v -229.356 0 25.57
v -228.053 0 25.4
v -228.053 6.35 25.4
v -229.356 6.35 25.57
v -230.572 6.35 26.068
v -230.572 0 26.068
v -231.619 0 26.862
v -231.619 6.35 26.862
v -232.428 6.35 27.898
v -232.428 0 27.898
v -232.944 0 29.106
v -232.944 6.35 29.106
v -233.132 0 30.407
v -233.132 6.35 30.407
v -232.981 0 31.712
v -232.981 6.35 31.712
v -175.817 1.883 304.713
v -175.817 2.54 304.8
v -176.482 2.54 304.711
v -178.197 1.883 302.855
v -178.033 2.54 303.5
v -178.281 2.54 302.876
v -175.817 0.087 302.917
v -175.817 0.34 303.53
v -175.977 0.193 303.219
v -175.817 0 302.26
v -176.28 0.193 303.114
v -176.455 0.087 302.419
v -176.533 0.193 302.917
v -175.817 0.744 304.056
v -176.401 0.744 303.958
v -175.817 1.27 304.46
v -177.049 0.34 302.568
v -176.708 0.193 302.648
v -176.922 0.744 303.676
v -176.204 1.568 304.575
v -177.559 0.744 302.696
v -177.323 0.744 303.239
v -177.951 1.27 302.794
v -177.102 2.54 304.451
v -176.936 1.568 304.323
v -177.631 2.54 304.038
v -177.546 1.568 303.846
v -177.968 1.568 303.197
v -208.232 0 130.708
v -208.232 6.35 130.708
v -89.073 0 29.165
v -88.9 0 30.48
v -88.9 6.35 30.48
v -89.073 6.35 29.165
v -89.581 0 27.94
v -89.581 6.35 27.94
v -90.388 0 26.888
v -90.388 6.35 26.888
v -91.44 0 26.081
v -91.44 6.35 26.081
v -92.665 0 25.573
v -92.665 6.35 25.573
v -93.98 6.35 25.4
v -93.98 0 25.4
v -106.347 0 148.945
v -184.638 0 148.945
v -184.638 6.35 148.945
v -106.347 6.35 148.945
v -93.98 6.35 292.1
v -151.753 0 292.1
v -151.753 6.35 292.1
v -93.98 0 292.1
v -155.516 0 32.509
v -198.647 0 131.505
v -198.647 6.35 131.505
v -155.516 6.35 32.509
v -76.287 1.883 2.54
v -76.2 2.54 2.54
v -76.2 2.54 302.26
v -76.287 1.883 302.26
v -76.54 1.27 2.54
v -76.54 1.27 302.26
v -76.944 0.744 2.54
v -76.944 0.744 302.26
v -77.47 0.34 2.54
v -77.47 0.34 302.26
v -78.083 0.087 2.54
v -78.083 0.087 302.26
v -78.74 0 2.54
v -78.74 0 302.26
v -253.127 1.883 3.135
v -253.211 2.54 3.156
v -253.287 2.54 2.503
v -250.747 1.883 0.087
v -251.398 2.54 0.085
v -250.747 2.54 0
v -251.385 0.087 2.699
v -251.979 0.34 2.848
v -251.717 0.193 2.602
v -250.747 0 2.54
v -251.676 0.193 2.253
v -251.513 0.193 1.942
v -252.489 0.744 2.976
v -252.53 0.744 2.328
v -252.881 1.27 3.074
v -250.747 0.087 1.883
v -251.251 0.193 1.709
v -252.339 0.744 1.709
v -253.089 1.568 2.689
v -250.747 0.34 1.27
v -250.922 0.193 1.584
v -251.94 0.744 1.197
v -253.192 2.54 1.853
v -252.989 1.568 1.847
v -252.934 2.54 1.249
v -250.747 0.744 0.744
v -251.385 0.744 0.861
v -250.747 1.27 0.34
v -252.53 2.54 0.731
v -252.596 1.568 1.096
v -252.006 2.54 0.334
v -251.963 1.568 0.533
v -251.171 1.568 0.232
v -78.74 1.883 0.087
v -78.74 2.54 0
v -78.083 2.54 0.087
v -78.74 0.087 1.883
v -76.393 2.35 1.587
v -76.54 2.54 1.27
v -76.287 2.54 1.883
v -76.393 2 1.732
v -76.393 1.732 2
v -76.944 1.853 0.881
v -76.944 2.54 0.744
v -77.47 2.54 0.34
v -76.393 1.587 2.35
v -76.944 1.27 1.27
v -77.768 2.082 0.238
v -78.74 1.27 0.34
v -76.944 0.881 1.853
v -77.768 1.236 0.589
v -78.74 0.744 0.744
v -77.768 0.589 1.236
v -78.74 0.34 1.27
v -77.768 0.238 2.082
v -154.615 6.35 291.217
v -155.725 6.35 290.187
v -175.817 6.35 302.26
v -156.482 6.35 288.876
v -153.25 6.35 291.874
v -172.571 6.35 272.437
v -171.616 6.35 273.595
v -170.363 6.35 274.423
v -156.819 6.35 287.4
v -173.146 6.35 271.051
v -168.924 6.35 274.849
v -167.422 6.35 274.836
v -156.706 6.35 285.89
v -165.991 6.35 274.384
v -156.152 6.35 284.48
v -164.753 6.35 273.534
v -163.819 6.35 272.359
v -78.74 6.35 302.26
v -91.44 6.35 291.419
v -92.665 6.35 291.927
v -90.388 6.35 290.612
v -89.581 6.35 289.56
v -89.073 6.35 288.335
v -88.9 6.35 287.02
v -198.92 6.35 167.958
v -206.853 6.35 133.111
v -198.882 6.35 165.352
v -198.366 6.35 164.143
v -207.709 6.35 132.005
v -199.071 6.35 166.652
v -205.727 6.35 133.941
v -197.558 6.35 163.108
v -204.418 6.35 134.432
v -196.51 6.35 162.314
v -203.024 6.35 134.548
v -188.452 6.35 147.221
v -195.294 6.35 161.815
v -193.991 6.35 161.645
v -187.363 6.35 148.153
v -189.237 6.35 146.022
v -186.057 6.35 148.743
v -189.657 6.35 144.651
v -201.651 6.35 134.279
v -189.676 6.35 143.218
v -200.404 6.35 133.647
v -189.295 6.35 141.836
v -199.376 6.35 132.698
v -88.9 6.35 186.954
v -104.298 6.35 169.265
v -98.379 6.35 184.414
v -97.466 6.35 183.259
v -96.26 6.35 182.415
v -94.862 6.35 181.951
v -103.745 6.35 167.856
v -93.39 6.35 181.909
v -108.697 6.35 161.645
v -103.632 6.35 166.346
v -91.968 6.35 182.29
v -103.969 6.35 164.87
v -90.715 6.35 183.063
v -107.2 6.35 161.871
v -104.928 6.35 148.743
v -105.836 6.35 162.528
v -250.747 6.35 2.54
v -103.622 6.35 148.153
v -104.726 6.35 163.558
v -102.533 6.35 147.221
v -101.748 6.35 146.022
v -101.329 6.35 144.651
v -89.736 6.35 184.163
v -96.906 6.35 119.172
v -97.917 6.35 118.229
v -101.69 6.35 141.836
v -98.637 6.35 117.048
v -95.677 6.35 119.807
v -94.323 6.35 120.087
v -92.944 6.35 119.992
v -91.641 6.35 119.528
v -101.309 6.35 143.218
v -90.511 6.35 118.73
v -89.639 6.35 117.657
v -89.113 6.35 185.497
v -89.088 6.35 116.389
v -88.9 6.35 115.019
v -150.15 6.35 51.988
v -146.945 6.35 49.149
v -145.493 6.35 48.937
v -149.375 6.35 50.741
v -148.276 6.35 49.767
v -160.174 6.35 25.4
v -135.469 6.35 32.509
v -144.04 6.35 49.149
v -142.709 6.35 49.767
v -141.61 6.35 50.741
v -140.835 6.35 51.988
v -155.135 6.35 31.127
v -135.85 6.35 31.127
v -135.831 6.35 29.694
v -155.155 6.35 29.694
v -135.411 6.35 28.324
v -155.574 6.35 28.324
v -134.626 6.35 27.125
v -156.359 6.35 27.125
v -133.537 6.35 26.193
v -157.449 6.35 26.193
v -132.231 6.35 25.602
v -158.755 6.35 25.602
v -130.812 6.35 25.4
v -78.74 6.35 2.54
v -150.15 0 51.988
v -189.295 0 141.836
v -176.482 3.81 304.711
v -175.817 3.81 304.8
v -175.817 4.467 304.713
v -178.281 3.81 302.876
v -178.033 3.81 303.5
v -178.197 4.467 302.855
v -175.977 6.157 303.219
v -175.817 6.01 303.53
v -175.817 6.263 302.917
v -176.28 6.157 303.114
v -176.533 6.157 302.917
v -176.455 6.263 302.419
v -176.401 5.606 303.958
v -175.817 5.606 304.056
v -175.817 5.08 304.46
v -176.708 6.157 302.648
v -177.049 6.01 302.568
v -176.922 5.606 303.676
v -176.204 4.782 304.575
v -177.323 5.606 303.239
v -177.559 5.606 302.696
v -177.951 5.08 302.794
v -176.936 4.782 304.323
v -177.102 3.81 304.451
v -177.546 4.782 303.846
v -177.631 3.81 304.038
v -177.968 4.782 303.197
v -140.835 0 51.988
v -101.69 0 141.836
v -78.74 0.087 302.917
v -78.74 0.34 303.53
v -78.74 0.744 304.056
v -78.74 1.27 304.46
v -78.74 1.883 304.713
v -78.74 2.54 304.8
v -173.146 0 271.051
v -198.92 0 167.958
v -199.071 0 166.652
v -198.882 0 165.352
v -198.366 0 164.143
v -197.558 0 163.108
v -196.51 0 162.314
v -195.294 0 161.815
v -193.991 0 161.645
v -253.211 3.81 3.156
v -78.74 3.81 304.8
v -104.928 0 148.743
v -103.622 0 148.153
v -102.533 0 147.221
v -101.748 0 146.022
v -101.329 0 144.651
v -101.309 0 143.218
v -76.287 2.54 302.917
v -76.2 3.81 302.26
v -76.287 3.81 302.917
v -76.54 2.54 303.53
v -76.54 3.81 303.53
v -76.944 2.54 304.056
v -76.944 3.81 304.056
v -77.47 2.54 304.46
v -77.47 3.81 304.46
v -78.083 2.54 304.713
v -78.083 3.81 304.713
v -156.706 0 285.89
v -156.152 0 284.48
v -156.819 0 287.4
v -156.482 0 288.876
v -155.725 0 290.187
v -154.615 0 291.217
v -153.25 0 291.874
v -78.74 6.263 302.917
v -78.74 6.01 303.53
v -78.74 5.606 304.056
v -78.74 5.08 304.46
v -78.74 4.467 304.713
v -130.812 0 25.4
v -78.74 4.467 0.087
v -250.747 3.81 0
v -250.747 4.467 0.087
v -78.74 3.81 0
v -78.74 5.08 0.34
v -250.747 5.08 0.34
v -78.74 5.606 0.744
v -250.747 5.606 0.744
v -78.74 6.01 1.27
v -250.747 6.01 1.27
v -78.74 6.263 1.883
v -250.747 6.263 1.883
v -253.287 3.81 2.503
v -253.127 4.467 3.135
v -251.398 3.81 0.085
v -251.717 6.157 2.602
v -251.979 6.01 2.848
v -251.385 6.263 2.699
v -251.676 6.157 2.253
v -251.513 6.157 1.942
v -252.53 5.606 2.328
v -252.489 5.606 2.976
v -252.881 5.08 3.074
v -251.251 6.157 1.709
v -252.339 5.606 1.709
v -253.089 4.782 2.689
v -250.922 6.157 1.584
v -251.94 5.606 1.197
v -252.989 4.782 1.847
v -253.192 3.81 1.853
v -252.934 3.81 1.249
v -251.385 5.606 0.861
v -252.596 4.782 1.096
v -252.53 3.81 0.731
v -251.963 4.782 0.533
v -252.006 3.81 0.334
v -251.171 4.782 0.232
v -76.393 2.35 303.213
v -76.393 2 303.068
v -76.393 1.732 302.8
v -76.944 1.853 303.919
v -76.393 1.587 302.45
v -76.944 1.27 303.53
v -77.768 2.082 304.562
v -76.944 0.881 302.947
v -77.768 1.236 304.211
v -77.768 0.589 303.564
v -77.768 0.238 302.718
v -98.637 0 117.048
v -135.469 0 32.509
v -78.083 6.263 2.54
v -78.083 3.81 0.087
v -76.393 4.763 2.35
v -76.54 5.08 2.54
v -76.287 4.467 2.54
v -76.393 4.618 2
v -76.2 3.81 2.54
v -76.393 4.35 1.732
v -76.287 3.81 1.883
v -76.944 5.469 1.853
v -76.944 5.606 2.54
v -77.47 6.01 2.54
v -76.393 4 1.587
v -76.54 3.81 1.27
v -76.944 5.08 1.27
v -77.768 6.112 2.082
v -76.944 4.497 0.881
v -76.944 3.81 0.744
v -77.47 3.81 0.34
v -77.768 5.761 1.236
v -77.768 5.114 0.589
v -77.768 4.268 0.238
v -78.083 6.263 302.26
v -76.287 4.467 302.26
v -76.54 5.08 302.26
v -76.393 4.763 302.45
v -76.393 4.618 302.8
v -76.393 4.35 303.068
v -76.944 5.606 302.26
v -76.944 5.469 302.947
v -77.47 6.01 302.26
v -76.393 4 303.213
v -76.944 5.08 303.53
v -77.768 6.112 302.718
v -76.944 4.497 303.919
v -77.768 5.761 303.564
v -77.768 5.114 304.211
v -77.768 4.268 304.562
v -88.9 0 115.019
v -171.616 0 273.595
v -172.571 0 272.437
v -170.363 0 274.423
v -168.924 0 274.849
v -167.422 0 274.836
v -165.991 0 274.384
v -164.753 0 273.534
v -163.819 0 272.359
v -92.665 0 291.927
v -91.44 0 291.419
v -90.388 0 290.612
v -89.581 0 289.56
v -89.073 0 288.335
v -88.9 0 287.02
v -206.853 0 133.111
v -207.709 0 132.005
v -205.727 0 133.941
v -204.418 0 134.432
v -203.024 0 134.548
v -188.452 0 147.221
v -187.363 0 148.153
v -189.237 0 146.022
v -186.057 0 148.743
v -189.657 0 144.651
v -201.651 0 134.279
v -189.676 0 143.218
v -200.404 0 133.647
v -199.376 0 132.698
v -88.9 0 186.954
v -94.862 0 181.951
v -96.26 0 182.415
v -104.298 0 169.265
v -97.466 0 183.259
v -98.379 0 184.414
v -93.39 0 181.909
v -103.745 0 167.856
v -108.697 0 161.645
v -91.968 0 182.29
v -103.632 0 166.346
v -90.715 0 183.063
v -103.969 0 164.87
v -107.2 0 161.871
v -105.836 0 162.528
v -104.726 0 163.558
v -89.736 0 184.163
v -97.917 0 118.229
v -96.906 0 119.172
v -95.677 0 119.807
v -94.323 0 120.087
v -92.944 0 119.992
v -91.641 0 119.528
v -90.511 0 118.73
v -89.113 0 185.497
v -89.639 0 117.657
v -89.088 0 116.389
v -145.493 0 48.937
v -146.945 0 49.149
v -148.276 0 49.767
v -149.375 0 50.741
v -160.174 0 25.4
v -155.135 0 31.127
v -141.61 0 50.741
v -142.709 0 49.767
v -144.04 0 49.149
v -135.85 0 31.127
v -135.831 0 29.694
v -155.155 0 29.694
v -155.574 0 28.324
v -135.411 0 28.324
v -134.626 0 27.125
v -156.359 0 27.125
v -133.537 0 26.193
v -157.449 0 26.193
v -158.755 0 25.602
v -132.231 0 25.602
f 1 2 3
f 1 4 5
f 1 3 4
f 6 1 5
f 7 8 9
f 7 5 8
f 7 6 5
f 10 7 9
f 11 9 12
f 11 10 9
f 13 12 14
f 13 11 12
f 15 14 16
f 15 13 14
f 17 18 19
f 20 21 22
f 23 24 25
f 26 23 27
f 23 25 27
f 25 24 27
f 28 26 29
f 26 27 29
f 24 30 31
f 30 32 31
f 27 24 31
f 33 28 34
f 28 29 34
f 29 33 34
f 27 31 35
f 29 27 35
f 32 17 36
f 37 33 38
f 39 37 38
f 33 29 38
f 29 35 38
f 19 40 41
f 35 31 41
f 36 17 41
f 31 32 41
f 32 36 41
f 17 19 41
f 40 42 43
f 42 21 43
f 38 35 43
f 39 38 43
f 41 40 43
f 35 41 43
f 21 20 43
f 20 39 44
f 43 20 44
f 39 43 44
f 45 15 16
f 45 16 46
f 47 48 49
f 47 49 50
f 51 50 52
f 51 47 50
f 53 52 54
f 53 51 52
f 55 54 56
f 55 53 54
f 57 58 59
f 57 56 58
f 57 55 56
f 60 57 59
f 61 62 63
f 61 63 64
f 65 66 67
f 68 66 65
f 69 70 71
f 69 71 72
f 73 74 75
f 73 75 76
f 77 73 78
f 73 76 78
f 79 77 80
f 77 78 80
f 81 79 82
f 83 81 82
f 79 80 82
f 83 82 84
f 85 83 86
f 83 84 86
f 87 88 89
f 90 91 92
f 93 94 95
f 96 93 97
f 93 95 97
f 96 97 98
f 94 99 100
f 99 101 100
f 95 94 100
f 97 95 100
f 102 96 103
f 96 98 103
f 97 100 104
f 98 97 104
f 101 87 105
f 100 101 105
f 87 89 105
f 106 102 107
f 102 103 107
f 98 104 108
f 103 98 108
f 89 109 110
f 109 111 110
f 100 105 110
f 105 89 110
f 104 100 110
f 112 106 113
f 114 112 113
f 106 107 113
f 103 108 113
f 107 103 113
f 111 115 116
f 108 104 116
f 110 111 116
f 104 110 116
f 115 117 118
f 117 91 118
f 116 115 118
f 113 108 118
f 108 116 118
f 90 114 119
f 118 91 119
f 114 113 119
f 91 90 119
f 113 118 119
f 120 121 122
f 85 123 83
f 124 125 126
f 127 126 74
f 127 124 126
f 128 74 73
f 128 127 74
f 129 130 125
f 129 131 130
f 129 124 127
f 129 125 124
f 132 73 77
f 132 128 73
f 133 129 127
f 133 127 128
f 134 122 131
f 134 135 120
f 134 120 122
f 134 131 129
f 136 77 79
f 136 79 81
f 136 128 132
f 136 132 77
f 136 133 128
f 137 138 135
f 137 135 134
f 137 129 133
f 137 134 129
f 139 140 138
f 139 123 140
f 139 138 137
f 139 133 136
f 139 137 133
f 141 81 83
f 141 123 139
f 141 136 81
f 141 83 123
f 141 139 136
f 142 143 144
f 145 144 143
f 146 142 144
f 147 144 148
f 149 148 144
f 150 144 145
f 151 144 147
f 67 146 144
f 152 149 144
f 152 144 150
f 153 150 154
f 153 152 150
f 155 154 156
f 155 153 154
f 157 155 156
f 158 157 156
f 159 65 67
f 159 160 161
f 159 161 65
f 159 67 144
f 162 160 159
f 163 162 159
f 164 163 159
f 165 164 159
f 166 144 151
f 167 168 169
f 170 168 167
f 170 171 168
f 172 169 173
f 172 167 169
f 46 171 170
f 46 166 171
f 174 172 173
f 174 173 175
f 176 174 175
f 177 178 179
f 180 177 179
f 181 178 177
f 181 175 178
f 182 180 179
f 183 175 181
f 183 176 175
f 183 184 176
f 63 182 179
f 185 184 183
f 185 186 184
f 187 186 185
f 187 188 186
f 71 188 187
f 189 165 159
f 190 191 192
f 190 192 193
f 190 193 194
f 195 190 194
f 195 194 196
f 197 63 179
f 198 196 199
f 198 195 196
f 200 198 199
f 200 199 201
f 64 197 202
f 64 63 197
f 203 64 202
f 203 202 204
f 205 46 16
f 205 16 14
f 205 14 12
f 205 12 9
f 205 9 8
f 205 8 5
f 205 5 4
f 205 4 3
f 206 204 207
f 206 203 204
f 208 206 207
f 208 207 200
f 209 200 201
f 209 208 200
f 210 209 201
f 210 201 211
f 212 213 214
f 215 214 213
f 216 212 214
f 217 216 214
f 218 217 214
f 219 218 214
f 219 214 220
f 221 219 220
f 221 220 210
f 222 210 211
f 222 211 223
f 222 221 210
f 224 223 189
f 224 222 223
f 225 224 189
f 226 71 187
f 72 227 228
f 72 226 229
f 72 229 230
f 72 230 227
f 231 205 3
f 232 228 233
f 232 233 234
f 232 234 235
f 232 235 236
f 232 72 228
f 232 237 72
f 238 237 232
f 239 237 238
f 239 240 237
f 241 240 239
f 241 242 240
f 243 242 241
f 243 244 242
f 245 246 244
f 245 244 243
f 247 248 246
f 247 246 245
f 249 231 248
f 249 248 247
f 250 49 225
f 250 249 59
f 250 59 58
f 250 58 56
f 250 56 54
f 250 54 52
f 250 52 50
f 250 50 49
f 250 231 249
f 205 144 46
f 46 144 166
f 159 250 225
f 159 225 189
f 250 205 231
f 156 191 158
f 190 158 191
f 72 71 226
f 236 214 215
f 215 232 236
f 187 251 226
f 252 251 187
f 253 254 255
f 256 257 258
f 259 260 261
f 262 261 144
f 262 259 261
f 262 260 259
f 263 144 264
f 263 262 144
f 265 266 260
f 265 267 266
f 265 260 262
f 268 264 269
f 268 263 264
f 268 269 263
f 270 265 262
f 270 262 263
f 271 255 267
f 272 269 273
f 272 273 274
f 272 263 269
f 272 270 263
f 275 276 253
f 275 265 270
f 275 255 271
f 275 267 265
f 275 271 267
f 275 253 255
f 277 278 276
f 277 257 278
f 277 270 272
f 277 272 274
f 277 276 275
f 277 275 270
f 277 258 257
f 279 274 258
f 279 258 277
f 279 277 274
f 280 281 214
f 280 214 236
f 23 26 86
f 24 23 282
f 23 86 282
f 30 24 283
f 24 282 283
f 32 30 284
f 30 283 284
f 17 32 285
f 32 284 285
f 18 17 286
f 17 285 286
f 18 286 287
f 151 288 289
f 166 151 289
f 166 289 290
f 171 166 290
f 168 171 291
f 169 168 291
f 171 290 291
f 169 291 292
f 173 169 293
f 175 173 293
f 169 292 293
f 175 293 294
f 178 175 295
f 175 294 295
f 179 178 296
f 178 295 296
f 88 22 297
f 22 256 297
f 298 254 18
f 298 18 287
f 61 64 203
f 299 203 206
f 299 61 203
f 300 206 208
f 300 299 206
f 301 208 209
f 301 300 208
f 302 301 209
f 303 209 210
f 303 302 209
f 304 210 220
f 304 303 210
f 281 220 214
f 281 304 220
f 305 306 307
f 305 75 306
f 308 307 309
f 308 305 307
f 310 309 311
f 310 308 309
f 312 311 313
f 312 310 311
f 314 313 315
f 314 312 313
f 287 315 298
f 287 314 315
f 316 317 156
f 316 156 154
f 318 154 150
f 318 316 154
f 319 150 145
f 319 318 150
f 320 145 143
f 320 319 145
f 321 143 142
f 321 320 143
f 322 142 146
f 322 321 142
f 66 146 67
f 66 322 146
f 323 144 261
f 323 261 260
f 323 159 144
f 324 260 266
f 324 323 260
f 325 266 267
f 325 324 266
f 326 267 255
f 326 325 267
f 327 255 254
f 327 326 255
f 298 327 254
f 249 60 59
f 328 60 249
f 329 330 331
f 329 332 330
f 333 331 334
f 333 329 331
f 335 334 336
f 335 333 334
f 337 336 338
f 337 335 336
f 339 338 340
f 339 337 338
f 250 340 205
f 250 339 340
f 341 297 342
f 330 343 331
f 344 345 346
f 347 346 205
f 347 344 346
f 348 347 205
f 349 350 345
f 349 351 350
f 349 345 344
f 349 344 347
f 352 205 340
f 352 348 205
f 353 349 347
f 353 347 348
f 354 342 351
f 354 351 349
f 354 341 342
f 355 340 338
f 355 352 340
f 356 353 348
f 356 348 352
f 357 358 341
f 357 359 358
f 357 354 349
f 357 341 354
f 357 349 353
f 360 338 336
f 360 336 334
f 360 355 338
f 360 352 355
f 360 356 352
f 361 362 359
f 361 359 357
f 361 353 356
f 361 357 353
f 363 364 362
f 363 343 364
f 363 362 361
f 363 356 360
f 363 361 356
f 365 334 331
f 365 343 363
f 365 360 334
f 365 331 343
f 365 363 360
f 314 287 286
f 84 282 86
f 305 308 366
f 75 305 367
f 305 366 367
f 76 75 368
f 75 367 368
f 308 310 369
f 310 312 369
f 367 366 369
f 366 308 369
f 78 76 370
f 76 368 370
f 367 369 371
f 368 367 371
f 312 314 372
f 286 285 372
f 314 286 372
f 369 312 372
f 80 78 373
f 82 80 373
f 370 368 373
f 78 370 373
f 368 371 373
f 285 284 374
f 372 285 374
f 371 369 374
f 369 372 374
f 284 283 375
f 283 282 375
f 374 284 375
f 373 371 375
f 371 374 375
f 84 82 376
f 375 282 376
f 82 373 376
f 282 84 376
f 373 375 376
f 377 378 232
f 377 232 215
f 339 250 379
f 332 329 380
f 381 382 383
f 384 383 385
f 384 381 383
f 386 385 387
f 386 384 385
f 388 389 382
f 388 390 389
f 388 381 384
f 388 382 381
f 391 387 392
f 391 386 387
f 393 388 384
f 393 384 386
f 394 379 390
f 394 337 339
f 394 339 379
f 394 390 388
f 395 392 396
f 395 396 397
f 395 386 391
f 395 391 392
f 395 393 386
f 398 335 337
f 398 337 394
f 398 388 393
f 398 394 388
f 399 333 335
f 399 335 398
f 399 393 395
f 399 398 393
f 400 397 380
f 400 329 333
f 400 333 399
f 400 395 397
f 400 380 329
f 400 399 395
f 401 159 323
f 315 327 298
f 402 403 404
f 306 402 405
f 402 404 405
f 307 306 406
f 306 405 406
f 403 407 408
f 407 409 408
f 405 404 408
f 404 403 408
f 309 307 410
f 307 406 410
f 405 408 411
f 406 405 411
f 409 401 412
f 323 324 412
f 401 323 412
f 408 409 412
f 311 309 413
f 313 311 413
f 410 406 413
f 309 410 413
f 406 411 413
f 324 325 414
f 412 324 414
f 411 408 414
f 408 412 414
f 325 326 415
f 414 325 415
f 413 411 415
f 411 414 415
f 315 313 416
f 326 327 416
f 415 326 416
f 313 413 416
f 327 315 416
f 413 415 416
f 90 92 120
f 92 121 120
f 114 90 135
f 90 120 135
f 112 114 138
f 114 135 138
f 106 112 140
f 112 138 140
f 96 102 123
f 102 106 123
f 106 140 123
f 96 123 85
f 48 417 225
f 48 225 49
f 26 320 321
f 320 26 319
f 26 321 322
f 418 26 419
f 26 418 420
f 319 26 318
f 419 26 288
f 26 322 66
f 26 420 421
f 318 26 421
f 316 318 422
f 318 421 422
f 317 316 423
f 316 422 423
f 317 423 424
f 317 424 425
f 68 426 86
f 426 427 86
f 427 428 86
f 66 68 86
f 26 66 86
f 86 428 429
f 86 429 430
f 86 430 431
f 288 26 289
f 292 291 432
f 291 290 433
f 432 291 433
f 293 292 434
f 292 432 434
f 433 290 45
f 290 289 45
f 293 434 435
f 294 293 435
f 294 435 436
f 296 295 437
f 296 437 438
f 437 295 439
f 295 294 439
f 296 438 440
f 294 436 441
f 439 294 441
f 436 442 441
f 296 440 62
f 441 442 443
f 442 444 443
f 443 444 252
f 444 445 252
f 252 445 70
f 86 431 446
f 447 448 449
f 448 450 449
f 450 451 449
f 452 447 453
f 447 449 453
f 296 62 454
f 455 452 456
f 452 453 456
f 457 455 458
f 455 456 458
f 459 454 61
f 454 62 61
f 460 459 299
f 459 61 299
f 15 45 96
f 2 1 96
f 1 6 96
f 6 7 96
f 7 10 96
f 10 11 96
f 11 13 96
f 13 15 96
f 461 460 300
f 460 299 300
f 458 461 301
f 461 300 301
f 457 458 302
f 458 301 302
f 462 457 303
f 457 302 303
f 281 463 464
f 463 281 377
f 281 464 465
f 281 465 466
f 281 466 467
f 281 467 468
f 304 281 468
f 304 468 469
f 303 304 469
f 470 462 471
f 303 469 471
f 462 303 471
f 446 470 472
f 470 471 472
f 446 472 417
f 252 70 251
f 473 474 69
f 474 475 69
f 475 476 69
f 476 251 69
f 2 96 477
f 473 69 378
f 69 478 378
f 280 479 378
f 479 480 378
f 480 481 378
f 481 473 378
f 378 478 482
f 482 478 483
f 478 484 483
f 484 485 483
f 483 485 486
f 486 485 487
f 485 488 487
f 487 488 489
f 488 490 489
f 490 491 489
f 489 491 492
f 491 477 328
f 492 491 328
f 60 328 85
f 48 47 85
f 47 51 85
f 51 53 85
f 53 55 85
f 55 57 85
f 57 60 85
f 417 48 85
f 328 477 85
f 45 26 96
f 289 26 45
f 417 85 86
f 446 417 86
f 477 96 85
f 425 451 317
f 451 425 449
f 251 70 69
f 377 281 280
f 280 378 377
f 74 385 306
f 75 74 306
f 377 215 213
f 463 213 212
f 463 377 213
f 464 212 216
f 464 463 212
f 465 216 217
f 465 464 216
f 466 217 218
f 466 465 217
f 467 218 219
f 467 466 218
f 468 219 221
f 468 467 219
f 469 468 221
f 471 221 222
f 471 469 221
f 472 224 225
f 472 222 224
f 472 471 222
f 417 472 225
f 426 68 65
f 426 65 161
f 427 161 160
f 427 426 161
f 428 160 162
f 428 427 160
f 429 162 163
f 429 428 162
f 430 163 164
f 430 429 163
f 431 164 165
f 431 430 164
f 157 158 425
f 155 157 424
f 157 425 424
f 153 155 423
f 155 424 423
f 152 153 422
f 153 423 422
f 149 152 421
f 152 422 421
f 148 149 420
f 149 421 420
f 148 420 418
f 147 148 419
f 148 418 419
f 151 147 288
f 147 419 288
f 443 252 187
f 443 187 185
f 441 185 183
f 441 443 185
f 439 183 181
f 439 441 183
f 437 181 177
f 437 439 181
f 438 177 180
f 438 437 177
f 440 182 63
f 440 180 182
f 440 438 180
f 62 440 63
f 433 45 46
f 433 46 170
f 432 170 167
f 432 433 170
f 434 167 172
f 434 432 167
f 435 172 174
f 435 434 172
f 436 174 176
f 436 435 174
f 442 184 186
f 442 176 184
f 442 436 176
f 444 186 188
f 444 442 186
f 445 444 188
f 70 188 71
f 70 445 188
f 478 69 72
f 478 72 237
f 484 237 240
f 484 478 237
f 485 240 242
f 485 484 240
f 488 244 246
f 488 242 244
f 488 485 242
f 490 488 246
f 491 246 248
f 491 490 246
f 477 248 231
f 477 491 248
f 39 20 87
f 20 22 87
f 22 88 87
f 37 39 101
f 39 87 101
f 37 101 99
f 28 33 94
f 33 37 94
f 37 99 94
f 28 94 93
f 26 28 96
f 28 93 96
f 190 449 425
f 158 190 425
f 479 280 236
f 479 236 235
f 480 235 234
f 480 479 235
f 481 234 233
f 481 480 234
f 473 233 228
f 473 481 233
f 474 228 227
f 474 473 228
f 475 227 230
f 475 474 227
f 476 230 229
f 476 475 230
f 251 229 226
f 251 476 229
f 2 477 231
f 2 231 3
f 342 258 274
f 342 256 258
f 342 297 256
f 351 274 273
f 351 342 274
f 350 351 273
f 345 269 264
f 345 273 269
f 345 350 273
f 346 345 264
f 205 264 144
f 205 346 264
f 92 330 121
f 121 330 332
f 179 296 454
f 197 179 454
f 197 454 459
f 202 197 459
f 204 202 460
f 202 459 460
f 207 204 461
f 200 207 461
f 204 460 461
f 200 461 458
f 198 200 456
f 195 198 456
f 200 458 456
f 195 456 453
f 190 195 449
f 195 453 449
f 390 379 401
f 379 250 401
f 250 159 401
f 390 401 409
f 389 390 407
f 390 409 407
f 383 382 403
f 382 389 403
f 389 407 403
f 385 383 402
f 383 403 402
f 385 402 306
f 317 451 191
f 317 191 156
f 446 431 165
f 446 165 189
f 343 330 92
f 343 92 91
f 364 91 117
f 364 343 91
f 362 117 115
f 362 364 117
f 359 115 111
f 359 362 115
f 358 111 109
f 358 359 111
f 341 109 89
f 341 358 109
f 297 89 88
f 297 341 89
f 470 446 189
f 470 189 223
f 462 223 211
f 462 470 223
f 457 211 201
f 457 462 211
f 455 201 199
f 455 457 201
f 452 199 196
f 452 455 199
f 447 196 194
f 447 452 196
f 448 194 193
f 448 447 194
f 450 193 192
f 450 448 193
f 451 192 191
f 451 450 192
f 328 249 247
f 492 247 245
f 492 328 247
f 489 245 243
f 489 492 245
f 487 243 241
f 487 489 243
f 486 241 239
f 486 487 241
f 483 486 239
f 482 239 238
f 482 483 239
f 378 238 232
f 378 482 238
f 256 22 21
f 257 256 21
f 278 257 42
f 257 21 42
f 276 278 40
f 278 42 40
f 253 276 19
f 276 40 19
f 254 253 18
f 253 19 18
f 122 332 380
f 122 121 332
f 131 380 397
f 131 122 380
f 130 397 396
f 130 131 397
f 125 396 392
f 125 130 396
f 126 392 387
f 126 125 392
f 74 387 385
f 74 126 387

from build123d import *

# Parameters (mm, degrees)
SKETCH1_W           = 254
SKETCH1_H           = 6.35
BOSS_EXTRUDE1_DEPTH = 304.8
CUT_EXTRUDE1_DEPTH  = 304.8
CUT_EXTRUDE2_DEPTH  = 397.811494919
CUT_EXTRUDE3_REACH  = 398.811
FILLET2_R           = 2.54


with BuildPart() as part:
    # Sketch1 → Boss-Extrude1 (new body)
    with BuildSketch(Plane.XY):
        with Locations((-127, 3.175)):
            Rectangle(SKETCH1_W, SKETCH1_H)
    extrude(amount=BOSS_EXTRUDE1_DEPTH)

    # Sketch2 → Cut-Extrude1 (cut)
    with BuildSketch(Plane(origin=(0, 6.35, 0), x_dir=(1, 0, 0), z_dir=(0, 1, 0))):
        Polygon((-177.8, -304.8), (-254, 0), (-254, -304.8), align=None)
    extrude(amount=-CUT_EXTRUDE1_DEPTH, mode=Mode.SUBTRACT)

    # Sketch4 → Cut-Extrude2 (cut, through all)
    with BuildSketch(Plane(origin=(0, 6.35, 0), x_dir=(1, 0, 0), z_dir=(0, 1, 0))):
        Polygon((-76.2, -127), (-76.2, 0), (0, 0), (0, -304.8), (-76.2, -304.8), (-76.2, -177.8), align=None)
    extrude(amount=-CUT_EXTRUDE2_DEPTH, mode=Mode.SUBTRACT)

    # Sketch7 → Cut-Extrude3 (cut, up to next)
    with BuildSketch(Plane(origin=(0, 0, 0), x_dir=(-1, 0, 0), z_dir=(0, -1, 0)), mode=Mode.PRIVATE) as cut_extrude3_sk1:
        with BuildLine():
            ThreePointArc((98.637189175, -117.047779868), (92.943689479, -119.991917487), (88.9, -115.0187434))
            Line((88.9, -115.0187434), (88.9, -30.48))
            ThreePointArc((88.9, -30.48), (90.387897552, -26.887897552), (93.98, -25.4))
            Line((93.98, -25.4), (130.811699734, -25.4))
            ThreePointArc((130.811699734, -25.4), (135.061047052, -27.696217075), (135.468888909, -32.509036468))
            Line((135.468888909, -32.509036468), (98.637189175, -117.047779868))
        make_face()
    cut_extrude3_tool1 = extrude(cut_extrude3_sk1.sketch, amount=-CUT_EXTRUDE3_REACH, mode=Mode.PRIVATE) & part.part
    # Sketch7 → Cut-Extrude3 (cut, up to next)
    with BuildSketch(Plane(origin=(0, 0, 0), x_dir=(-1, 0, 0), z_dir=(0, -1, 0)), mode=Mode.PRIVATE) as cut_extrude3_sk2:
        with BuildLine():
            Line((198.646676859, -131.504754308), (155.51638644, -32.509036468))
            ThreePointArc((155.51638644, -32.509036468), (155.924228297, -27.696217075), (160.173575615, -25.4))
            Line((160.173575615, -25.4), (228.052795494, -25.4))
            ThreePointArc((228.052795494, -25.4), (232.056879119, -27.353705976), (232.981119395, -31.712080975))
            Line((232.981119395, -31.712080975), (208.232189935, -130.707798815))
            ThreePointArc((208.232189935, -130.707798815), (203.724773416, -134.538250504), (198.646676859, -131.504754308))
        make_face()
    cut_extrude3_tool2 = extrude(cut_extrude3_sk2.sketch, amount=-CUT_EXTRUDE3_REACH, mode=Mode.PRIVATE) & part.part
    # Sketch7 → Cut-Extrude3 (cut, up to next)
    with BuildSketch(Plane(origin=(0, 0, 0), x_dir=(-1, 0, 0), z_dir=(0, -1, 0)), mode=Mode.PRIVATE) as cut_extrude3_sk3:
        with BuildLine():
            ThreePointArc((156.152382169, -284.48), (156.152382169, -289.56), (151.752973118, -292.1))
            Line((151.752973118, -292.1), (93.98, -292.1))
            ThreePointArc((93.98, -292.1), (90.387897552, -290.612102448), (88.9, -287.02))
            Line((88.9, -287.02), (88.9, -186.954275256))
            ThreePointArc((88.9, -186.954275256), (92.665199251, -182.047372059), (98.379409051, -184.414275256))
            Line((98.379409051, -184.414275256), (156.152382169, -284.48))
        make_face()
    cut_extrude3_tool3 = extrude(cut_extrude3_sk3.sketch, amount=-CUT_EXTRUDE3_REACH, mode=Mode.PRIVATE) & part.part
    # Sketch7 → Cut-Extrude3 (cut, up to next)
    with BuildSketch(Plane(origin=(0, 0, 0), x_dir=(-1, 0, 0), z_dir=(0, -1, 0)), mode=Mode.PRIVATE) as cut_extrude3_sk4:
        with BuildLine():
            Line((173.146484204, -271.050621738), (198.919755106, -167.957538129))
            ThreePointArc((198.919755106, -167.957538129), (197.995514831, -163.59916313), (193.991431206, -161.645457154))
            Line((193.991431206, -161.645457154), (108.69734073, -161.645457154))
            ThreePointArc((108.69734073, -161.645457154), (104.297931679, -164.185457154), (104.297931679, -169.265457154))
            Line((104.297931679, -169.265457154), (163.818751252, -272.358540762))
            ThreePointArc((163.818751252, -272.358540762), (168.923568535, -274.849325912), (173.146484204, -271.050621738))
        make_face()
    cut_extrude3_tool4 = extrude(cut_extrude3_sk4.sketch, amount=-CUT_EXTRUDE3_REACH, mode=Mode.PRIVATE) & part.part
    # Sketch7 → Cut-Extrude3 (cut, up to next)
    with BuildSketch(Plane(origin=(0, 0, 0), x_dir=(-1, 0, 0), z_dir=(0, -1, 0)), mode=Mode.PRIVATE) as cut_extrude3_sk5:
        with BuildLine():
            ThreePointArc((106.347495425, -148.945457154), (102.098148107, -146.649240078), (101.69030625, -141.836420686))
            Line((101.69030625, -141.836420686), (140.835448499, -51.987699072))
            ThreePointArc((140.835448499, -51.987699072), (145.492637674, -48.93673554), (150.14982685, -51.987699072))
            Line((150.14982685, -51.987699072), (189.2949691, -141.836420686))
            ThreePointArc((189.2949691, -141.836420686), (188.887127243, -146.649240078), (184.637779925, -148.945457154))
            Line((184.637779925, -148.945457154), (106.347495425, -148.945457154))
        make_face()
    cut_extrude3_tool5 = extrude(cut_extrude3_sk5.sketch, amount=-CUT_EXTRUDE3_REACH, mode=Mode.PRIVATE) & part.part
    add(cut_extrude3_tool1.solids().sort_by_distance((-105.779096, 0, 61.624334))[0], mode=Mode.SUBTRACT)
    add(cut_extrude3_tool2.solids().sort_by_distance((-197.184891, 0, 64.864333))[0], mode=Mode.SUBTRACT)
    add(cut_extrude3_tool3.solids().sort_by_distance((-112.936879, 0, 251.56545))[0], mode=Mode.SUBTRACT)
    add(cut_extrude3_tool4.solids().sort_by_distance((-156.854236, 0, 201.939756))[0], mode=Mode.SUBTRACT)
    add(cut_extrude3_tool5.solids().sort_by_distance((-145.492638, 0, 113.262605))[0], mode=Mode.SUBTRACT)

    # Fillet2
    fillet2_edges = [part.edges().sort_by_distance(p)[0] for p in [
        (-215.9, 0, 152.4),
        (-215.9, 6.35, 152.4),
        (-177.8, 3.175, 304.8),
        (-165.1, 0, 0),
        (-165.1, 6.35, 0),
        (-127, 6.35, 304.8),
        (-127, 0, 304.8),
        (-76.2, 6.35, 152.4),
        (-76.2, 3.175, 304.8),
        (-76.2, 3.175, 0),
        (-76.2, 0, 152.4),
        (-254, 3.175, 0),
    ]]
    fillet(fillet2_edges, radius=FILLET2_R)


solid = part.part
